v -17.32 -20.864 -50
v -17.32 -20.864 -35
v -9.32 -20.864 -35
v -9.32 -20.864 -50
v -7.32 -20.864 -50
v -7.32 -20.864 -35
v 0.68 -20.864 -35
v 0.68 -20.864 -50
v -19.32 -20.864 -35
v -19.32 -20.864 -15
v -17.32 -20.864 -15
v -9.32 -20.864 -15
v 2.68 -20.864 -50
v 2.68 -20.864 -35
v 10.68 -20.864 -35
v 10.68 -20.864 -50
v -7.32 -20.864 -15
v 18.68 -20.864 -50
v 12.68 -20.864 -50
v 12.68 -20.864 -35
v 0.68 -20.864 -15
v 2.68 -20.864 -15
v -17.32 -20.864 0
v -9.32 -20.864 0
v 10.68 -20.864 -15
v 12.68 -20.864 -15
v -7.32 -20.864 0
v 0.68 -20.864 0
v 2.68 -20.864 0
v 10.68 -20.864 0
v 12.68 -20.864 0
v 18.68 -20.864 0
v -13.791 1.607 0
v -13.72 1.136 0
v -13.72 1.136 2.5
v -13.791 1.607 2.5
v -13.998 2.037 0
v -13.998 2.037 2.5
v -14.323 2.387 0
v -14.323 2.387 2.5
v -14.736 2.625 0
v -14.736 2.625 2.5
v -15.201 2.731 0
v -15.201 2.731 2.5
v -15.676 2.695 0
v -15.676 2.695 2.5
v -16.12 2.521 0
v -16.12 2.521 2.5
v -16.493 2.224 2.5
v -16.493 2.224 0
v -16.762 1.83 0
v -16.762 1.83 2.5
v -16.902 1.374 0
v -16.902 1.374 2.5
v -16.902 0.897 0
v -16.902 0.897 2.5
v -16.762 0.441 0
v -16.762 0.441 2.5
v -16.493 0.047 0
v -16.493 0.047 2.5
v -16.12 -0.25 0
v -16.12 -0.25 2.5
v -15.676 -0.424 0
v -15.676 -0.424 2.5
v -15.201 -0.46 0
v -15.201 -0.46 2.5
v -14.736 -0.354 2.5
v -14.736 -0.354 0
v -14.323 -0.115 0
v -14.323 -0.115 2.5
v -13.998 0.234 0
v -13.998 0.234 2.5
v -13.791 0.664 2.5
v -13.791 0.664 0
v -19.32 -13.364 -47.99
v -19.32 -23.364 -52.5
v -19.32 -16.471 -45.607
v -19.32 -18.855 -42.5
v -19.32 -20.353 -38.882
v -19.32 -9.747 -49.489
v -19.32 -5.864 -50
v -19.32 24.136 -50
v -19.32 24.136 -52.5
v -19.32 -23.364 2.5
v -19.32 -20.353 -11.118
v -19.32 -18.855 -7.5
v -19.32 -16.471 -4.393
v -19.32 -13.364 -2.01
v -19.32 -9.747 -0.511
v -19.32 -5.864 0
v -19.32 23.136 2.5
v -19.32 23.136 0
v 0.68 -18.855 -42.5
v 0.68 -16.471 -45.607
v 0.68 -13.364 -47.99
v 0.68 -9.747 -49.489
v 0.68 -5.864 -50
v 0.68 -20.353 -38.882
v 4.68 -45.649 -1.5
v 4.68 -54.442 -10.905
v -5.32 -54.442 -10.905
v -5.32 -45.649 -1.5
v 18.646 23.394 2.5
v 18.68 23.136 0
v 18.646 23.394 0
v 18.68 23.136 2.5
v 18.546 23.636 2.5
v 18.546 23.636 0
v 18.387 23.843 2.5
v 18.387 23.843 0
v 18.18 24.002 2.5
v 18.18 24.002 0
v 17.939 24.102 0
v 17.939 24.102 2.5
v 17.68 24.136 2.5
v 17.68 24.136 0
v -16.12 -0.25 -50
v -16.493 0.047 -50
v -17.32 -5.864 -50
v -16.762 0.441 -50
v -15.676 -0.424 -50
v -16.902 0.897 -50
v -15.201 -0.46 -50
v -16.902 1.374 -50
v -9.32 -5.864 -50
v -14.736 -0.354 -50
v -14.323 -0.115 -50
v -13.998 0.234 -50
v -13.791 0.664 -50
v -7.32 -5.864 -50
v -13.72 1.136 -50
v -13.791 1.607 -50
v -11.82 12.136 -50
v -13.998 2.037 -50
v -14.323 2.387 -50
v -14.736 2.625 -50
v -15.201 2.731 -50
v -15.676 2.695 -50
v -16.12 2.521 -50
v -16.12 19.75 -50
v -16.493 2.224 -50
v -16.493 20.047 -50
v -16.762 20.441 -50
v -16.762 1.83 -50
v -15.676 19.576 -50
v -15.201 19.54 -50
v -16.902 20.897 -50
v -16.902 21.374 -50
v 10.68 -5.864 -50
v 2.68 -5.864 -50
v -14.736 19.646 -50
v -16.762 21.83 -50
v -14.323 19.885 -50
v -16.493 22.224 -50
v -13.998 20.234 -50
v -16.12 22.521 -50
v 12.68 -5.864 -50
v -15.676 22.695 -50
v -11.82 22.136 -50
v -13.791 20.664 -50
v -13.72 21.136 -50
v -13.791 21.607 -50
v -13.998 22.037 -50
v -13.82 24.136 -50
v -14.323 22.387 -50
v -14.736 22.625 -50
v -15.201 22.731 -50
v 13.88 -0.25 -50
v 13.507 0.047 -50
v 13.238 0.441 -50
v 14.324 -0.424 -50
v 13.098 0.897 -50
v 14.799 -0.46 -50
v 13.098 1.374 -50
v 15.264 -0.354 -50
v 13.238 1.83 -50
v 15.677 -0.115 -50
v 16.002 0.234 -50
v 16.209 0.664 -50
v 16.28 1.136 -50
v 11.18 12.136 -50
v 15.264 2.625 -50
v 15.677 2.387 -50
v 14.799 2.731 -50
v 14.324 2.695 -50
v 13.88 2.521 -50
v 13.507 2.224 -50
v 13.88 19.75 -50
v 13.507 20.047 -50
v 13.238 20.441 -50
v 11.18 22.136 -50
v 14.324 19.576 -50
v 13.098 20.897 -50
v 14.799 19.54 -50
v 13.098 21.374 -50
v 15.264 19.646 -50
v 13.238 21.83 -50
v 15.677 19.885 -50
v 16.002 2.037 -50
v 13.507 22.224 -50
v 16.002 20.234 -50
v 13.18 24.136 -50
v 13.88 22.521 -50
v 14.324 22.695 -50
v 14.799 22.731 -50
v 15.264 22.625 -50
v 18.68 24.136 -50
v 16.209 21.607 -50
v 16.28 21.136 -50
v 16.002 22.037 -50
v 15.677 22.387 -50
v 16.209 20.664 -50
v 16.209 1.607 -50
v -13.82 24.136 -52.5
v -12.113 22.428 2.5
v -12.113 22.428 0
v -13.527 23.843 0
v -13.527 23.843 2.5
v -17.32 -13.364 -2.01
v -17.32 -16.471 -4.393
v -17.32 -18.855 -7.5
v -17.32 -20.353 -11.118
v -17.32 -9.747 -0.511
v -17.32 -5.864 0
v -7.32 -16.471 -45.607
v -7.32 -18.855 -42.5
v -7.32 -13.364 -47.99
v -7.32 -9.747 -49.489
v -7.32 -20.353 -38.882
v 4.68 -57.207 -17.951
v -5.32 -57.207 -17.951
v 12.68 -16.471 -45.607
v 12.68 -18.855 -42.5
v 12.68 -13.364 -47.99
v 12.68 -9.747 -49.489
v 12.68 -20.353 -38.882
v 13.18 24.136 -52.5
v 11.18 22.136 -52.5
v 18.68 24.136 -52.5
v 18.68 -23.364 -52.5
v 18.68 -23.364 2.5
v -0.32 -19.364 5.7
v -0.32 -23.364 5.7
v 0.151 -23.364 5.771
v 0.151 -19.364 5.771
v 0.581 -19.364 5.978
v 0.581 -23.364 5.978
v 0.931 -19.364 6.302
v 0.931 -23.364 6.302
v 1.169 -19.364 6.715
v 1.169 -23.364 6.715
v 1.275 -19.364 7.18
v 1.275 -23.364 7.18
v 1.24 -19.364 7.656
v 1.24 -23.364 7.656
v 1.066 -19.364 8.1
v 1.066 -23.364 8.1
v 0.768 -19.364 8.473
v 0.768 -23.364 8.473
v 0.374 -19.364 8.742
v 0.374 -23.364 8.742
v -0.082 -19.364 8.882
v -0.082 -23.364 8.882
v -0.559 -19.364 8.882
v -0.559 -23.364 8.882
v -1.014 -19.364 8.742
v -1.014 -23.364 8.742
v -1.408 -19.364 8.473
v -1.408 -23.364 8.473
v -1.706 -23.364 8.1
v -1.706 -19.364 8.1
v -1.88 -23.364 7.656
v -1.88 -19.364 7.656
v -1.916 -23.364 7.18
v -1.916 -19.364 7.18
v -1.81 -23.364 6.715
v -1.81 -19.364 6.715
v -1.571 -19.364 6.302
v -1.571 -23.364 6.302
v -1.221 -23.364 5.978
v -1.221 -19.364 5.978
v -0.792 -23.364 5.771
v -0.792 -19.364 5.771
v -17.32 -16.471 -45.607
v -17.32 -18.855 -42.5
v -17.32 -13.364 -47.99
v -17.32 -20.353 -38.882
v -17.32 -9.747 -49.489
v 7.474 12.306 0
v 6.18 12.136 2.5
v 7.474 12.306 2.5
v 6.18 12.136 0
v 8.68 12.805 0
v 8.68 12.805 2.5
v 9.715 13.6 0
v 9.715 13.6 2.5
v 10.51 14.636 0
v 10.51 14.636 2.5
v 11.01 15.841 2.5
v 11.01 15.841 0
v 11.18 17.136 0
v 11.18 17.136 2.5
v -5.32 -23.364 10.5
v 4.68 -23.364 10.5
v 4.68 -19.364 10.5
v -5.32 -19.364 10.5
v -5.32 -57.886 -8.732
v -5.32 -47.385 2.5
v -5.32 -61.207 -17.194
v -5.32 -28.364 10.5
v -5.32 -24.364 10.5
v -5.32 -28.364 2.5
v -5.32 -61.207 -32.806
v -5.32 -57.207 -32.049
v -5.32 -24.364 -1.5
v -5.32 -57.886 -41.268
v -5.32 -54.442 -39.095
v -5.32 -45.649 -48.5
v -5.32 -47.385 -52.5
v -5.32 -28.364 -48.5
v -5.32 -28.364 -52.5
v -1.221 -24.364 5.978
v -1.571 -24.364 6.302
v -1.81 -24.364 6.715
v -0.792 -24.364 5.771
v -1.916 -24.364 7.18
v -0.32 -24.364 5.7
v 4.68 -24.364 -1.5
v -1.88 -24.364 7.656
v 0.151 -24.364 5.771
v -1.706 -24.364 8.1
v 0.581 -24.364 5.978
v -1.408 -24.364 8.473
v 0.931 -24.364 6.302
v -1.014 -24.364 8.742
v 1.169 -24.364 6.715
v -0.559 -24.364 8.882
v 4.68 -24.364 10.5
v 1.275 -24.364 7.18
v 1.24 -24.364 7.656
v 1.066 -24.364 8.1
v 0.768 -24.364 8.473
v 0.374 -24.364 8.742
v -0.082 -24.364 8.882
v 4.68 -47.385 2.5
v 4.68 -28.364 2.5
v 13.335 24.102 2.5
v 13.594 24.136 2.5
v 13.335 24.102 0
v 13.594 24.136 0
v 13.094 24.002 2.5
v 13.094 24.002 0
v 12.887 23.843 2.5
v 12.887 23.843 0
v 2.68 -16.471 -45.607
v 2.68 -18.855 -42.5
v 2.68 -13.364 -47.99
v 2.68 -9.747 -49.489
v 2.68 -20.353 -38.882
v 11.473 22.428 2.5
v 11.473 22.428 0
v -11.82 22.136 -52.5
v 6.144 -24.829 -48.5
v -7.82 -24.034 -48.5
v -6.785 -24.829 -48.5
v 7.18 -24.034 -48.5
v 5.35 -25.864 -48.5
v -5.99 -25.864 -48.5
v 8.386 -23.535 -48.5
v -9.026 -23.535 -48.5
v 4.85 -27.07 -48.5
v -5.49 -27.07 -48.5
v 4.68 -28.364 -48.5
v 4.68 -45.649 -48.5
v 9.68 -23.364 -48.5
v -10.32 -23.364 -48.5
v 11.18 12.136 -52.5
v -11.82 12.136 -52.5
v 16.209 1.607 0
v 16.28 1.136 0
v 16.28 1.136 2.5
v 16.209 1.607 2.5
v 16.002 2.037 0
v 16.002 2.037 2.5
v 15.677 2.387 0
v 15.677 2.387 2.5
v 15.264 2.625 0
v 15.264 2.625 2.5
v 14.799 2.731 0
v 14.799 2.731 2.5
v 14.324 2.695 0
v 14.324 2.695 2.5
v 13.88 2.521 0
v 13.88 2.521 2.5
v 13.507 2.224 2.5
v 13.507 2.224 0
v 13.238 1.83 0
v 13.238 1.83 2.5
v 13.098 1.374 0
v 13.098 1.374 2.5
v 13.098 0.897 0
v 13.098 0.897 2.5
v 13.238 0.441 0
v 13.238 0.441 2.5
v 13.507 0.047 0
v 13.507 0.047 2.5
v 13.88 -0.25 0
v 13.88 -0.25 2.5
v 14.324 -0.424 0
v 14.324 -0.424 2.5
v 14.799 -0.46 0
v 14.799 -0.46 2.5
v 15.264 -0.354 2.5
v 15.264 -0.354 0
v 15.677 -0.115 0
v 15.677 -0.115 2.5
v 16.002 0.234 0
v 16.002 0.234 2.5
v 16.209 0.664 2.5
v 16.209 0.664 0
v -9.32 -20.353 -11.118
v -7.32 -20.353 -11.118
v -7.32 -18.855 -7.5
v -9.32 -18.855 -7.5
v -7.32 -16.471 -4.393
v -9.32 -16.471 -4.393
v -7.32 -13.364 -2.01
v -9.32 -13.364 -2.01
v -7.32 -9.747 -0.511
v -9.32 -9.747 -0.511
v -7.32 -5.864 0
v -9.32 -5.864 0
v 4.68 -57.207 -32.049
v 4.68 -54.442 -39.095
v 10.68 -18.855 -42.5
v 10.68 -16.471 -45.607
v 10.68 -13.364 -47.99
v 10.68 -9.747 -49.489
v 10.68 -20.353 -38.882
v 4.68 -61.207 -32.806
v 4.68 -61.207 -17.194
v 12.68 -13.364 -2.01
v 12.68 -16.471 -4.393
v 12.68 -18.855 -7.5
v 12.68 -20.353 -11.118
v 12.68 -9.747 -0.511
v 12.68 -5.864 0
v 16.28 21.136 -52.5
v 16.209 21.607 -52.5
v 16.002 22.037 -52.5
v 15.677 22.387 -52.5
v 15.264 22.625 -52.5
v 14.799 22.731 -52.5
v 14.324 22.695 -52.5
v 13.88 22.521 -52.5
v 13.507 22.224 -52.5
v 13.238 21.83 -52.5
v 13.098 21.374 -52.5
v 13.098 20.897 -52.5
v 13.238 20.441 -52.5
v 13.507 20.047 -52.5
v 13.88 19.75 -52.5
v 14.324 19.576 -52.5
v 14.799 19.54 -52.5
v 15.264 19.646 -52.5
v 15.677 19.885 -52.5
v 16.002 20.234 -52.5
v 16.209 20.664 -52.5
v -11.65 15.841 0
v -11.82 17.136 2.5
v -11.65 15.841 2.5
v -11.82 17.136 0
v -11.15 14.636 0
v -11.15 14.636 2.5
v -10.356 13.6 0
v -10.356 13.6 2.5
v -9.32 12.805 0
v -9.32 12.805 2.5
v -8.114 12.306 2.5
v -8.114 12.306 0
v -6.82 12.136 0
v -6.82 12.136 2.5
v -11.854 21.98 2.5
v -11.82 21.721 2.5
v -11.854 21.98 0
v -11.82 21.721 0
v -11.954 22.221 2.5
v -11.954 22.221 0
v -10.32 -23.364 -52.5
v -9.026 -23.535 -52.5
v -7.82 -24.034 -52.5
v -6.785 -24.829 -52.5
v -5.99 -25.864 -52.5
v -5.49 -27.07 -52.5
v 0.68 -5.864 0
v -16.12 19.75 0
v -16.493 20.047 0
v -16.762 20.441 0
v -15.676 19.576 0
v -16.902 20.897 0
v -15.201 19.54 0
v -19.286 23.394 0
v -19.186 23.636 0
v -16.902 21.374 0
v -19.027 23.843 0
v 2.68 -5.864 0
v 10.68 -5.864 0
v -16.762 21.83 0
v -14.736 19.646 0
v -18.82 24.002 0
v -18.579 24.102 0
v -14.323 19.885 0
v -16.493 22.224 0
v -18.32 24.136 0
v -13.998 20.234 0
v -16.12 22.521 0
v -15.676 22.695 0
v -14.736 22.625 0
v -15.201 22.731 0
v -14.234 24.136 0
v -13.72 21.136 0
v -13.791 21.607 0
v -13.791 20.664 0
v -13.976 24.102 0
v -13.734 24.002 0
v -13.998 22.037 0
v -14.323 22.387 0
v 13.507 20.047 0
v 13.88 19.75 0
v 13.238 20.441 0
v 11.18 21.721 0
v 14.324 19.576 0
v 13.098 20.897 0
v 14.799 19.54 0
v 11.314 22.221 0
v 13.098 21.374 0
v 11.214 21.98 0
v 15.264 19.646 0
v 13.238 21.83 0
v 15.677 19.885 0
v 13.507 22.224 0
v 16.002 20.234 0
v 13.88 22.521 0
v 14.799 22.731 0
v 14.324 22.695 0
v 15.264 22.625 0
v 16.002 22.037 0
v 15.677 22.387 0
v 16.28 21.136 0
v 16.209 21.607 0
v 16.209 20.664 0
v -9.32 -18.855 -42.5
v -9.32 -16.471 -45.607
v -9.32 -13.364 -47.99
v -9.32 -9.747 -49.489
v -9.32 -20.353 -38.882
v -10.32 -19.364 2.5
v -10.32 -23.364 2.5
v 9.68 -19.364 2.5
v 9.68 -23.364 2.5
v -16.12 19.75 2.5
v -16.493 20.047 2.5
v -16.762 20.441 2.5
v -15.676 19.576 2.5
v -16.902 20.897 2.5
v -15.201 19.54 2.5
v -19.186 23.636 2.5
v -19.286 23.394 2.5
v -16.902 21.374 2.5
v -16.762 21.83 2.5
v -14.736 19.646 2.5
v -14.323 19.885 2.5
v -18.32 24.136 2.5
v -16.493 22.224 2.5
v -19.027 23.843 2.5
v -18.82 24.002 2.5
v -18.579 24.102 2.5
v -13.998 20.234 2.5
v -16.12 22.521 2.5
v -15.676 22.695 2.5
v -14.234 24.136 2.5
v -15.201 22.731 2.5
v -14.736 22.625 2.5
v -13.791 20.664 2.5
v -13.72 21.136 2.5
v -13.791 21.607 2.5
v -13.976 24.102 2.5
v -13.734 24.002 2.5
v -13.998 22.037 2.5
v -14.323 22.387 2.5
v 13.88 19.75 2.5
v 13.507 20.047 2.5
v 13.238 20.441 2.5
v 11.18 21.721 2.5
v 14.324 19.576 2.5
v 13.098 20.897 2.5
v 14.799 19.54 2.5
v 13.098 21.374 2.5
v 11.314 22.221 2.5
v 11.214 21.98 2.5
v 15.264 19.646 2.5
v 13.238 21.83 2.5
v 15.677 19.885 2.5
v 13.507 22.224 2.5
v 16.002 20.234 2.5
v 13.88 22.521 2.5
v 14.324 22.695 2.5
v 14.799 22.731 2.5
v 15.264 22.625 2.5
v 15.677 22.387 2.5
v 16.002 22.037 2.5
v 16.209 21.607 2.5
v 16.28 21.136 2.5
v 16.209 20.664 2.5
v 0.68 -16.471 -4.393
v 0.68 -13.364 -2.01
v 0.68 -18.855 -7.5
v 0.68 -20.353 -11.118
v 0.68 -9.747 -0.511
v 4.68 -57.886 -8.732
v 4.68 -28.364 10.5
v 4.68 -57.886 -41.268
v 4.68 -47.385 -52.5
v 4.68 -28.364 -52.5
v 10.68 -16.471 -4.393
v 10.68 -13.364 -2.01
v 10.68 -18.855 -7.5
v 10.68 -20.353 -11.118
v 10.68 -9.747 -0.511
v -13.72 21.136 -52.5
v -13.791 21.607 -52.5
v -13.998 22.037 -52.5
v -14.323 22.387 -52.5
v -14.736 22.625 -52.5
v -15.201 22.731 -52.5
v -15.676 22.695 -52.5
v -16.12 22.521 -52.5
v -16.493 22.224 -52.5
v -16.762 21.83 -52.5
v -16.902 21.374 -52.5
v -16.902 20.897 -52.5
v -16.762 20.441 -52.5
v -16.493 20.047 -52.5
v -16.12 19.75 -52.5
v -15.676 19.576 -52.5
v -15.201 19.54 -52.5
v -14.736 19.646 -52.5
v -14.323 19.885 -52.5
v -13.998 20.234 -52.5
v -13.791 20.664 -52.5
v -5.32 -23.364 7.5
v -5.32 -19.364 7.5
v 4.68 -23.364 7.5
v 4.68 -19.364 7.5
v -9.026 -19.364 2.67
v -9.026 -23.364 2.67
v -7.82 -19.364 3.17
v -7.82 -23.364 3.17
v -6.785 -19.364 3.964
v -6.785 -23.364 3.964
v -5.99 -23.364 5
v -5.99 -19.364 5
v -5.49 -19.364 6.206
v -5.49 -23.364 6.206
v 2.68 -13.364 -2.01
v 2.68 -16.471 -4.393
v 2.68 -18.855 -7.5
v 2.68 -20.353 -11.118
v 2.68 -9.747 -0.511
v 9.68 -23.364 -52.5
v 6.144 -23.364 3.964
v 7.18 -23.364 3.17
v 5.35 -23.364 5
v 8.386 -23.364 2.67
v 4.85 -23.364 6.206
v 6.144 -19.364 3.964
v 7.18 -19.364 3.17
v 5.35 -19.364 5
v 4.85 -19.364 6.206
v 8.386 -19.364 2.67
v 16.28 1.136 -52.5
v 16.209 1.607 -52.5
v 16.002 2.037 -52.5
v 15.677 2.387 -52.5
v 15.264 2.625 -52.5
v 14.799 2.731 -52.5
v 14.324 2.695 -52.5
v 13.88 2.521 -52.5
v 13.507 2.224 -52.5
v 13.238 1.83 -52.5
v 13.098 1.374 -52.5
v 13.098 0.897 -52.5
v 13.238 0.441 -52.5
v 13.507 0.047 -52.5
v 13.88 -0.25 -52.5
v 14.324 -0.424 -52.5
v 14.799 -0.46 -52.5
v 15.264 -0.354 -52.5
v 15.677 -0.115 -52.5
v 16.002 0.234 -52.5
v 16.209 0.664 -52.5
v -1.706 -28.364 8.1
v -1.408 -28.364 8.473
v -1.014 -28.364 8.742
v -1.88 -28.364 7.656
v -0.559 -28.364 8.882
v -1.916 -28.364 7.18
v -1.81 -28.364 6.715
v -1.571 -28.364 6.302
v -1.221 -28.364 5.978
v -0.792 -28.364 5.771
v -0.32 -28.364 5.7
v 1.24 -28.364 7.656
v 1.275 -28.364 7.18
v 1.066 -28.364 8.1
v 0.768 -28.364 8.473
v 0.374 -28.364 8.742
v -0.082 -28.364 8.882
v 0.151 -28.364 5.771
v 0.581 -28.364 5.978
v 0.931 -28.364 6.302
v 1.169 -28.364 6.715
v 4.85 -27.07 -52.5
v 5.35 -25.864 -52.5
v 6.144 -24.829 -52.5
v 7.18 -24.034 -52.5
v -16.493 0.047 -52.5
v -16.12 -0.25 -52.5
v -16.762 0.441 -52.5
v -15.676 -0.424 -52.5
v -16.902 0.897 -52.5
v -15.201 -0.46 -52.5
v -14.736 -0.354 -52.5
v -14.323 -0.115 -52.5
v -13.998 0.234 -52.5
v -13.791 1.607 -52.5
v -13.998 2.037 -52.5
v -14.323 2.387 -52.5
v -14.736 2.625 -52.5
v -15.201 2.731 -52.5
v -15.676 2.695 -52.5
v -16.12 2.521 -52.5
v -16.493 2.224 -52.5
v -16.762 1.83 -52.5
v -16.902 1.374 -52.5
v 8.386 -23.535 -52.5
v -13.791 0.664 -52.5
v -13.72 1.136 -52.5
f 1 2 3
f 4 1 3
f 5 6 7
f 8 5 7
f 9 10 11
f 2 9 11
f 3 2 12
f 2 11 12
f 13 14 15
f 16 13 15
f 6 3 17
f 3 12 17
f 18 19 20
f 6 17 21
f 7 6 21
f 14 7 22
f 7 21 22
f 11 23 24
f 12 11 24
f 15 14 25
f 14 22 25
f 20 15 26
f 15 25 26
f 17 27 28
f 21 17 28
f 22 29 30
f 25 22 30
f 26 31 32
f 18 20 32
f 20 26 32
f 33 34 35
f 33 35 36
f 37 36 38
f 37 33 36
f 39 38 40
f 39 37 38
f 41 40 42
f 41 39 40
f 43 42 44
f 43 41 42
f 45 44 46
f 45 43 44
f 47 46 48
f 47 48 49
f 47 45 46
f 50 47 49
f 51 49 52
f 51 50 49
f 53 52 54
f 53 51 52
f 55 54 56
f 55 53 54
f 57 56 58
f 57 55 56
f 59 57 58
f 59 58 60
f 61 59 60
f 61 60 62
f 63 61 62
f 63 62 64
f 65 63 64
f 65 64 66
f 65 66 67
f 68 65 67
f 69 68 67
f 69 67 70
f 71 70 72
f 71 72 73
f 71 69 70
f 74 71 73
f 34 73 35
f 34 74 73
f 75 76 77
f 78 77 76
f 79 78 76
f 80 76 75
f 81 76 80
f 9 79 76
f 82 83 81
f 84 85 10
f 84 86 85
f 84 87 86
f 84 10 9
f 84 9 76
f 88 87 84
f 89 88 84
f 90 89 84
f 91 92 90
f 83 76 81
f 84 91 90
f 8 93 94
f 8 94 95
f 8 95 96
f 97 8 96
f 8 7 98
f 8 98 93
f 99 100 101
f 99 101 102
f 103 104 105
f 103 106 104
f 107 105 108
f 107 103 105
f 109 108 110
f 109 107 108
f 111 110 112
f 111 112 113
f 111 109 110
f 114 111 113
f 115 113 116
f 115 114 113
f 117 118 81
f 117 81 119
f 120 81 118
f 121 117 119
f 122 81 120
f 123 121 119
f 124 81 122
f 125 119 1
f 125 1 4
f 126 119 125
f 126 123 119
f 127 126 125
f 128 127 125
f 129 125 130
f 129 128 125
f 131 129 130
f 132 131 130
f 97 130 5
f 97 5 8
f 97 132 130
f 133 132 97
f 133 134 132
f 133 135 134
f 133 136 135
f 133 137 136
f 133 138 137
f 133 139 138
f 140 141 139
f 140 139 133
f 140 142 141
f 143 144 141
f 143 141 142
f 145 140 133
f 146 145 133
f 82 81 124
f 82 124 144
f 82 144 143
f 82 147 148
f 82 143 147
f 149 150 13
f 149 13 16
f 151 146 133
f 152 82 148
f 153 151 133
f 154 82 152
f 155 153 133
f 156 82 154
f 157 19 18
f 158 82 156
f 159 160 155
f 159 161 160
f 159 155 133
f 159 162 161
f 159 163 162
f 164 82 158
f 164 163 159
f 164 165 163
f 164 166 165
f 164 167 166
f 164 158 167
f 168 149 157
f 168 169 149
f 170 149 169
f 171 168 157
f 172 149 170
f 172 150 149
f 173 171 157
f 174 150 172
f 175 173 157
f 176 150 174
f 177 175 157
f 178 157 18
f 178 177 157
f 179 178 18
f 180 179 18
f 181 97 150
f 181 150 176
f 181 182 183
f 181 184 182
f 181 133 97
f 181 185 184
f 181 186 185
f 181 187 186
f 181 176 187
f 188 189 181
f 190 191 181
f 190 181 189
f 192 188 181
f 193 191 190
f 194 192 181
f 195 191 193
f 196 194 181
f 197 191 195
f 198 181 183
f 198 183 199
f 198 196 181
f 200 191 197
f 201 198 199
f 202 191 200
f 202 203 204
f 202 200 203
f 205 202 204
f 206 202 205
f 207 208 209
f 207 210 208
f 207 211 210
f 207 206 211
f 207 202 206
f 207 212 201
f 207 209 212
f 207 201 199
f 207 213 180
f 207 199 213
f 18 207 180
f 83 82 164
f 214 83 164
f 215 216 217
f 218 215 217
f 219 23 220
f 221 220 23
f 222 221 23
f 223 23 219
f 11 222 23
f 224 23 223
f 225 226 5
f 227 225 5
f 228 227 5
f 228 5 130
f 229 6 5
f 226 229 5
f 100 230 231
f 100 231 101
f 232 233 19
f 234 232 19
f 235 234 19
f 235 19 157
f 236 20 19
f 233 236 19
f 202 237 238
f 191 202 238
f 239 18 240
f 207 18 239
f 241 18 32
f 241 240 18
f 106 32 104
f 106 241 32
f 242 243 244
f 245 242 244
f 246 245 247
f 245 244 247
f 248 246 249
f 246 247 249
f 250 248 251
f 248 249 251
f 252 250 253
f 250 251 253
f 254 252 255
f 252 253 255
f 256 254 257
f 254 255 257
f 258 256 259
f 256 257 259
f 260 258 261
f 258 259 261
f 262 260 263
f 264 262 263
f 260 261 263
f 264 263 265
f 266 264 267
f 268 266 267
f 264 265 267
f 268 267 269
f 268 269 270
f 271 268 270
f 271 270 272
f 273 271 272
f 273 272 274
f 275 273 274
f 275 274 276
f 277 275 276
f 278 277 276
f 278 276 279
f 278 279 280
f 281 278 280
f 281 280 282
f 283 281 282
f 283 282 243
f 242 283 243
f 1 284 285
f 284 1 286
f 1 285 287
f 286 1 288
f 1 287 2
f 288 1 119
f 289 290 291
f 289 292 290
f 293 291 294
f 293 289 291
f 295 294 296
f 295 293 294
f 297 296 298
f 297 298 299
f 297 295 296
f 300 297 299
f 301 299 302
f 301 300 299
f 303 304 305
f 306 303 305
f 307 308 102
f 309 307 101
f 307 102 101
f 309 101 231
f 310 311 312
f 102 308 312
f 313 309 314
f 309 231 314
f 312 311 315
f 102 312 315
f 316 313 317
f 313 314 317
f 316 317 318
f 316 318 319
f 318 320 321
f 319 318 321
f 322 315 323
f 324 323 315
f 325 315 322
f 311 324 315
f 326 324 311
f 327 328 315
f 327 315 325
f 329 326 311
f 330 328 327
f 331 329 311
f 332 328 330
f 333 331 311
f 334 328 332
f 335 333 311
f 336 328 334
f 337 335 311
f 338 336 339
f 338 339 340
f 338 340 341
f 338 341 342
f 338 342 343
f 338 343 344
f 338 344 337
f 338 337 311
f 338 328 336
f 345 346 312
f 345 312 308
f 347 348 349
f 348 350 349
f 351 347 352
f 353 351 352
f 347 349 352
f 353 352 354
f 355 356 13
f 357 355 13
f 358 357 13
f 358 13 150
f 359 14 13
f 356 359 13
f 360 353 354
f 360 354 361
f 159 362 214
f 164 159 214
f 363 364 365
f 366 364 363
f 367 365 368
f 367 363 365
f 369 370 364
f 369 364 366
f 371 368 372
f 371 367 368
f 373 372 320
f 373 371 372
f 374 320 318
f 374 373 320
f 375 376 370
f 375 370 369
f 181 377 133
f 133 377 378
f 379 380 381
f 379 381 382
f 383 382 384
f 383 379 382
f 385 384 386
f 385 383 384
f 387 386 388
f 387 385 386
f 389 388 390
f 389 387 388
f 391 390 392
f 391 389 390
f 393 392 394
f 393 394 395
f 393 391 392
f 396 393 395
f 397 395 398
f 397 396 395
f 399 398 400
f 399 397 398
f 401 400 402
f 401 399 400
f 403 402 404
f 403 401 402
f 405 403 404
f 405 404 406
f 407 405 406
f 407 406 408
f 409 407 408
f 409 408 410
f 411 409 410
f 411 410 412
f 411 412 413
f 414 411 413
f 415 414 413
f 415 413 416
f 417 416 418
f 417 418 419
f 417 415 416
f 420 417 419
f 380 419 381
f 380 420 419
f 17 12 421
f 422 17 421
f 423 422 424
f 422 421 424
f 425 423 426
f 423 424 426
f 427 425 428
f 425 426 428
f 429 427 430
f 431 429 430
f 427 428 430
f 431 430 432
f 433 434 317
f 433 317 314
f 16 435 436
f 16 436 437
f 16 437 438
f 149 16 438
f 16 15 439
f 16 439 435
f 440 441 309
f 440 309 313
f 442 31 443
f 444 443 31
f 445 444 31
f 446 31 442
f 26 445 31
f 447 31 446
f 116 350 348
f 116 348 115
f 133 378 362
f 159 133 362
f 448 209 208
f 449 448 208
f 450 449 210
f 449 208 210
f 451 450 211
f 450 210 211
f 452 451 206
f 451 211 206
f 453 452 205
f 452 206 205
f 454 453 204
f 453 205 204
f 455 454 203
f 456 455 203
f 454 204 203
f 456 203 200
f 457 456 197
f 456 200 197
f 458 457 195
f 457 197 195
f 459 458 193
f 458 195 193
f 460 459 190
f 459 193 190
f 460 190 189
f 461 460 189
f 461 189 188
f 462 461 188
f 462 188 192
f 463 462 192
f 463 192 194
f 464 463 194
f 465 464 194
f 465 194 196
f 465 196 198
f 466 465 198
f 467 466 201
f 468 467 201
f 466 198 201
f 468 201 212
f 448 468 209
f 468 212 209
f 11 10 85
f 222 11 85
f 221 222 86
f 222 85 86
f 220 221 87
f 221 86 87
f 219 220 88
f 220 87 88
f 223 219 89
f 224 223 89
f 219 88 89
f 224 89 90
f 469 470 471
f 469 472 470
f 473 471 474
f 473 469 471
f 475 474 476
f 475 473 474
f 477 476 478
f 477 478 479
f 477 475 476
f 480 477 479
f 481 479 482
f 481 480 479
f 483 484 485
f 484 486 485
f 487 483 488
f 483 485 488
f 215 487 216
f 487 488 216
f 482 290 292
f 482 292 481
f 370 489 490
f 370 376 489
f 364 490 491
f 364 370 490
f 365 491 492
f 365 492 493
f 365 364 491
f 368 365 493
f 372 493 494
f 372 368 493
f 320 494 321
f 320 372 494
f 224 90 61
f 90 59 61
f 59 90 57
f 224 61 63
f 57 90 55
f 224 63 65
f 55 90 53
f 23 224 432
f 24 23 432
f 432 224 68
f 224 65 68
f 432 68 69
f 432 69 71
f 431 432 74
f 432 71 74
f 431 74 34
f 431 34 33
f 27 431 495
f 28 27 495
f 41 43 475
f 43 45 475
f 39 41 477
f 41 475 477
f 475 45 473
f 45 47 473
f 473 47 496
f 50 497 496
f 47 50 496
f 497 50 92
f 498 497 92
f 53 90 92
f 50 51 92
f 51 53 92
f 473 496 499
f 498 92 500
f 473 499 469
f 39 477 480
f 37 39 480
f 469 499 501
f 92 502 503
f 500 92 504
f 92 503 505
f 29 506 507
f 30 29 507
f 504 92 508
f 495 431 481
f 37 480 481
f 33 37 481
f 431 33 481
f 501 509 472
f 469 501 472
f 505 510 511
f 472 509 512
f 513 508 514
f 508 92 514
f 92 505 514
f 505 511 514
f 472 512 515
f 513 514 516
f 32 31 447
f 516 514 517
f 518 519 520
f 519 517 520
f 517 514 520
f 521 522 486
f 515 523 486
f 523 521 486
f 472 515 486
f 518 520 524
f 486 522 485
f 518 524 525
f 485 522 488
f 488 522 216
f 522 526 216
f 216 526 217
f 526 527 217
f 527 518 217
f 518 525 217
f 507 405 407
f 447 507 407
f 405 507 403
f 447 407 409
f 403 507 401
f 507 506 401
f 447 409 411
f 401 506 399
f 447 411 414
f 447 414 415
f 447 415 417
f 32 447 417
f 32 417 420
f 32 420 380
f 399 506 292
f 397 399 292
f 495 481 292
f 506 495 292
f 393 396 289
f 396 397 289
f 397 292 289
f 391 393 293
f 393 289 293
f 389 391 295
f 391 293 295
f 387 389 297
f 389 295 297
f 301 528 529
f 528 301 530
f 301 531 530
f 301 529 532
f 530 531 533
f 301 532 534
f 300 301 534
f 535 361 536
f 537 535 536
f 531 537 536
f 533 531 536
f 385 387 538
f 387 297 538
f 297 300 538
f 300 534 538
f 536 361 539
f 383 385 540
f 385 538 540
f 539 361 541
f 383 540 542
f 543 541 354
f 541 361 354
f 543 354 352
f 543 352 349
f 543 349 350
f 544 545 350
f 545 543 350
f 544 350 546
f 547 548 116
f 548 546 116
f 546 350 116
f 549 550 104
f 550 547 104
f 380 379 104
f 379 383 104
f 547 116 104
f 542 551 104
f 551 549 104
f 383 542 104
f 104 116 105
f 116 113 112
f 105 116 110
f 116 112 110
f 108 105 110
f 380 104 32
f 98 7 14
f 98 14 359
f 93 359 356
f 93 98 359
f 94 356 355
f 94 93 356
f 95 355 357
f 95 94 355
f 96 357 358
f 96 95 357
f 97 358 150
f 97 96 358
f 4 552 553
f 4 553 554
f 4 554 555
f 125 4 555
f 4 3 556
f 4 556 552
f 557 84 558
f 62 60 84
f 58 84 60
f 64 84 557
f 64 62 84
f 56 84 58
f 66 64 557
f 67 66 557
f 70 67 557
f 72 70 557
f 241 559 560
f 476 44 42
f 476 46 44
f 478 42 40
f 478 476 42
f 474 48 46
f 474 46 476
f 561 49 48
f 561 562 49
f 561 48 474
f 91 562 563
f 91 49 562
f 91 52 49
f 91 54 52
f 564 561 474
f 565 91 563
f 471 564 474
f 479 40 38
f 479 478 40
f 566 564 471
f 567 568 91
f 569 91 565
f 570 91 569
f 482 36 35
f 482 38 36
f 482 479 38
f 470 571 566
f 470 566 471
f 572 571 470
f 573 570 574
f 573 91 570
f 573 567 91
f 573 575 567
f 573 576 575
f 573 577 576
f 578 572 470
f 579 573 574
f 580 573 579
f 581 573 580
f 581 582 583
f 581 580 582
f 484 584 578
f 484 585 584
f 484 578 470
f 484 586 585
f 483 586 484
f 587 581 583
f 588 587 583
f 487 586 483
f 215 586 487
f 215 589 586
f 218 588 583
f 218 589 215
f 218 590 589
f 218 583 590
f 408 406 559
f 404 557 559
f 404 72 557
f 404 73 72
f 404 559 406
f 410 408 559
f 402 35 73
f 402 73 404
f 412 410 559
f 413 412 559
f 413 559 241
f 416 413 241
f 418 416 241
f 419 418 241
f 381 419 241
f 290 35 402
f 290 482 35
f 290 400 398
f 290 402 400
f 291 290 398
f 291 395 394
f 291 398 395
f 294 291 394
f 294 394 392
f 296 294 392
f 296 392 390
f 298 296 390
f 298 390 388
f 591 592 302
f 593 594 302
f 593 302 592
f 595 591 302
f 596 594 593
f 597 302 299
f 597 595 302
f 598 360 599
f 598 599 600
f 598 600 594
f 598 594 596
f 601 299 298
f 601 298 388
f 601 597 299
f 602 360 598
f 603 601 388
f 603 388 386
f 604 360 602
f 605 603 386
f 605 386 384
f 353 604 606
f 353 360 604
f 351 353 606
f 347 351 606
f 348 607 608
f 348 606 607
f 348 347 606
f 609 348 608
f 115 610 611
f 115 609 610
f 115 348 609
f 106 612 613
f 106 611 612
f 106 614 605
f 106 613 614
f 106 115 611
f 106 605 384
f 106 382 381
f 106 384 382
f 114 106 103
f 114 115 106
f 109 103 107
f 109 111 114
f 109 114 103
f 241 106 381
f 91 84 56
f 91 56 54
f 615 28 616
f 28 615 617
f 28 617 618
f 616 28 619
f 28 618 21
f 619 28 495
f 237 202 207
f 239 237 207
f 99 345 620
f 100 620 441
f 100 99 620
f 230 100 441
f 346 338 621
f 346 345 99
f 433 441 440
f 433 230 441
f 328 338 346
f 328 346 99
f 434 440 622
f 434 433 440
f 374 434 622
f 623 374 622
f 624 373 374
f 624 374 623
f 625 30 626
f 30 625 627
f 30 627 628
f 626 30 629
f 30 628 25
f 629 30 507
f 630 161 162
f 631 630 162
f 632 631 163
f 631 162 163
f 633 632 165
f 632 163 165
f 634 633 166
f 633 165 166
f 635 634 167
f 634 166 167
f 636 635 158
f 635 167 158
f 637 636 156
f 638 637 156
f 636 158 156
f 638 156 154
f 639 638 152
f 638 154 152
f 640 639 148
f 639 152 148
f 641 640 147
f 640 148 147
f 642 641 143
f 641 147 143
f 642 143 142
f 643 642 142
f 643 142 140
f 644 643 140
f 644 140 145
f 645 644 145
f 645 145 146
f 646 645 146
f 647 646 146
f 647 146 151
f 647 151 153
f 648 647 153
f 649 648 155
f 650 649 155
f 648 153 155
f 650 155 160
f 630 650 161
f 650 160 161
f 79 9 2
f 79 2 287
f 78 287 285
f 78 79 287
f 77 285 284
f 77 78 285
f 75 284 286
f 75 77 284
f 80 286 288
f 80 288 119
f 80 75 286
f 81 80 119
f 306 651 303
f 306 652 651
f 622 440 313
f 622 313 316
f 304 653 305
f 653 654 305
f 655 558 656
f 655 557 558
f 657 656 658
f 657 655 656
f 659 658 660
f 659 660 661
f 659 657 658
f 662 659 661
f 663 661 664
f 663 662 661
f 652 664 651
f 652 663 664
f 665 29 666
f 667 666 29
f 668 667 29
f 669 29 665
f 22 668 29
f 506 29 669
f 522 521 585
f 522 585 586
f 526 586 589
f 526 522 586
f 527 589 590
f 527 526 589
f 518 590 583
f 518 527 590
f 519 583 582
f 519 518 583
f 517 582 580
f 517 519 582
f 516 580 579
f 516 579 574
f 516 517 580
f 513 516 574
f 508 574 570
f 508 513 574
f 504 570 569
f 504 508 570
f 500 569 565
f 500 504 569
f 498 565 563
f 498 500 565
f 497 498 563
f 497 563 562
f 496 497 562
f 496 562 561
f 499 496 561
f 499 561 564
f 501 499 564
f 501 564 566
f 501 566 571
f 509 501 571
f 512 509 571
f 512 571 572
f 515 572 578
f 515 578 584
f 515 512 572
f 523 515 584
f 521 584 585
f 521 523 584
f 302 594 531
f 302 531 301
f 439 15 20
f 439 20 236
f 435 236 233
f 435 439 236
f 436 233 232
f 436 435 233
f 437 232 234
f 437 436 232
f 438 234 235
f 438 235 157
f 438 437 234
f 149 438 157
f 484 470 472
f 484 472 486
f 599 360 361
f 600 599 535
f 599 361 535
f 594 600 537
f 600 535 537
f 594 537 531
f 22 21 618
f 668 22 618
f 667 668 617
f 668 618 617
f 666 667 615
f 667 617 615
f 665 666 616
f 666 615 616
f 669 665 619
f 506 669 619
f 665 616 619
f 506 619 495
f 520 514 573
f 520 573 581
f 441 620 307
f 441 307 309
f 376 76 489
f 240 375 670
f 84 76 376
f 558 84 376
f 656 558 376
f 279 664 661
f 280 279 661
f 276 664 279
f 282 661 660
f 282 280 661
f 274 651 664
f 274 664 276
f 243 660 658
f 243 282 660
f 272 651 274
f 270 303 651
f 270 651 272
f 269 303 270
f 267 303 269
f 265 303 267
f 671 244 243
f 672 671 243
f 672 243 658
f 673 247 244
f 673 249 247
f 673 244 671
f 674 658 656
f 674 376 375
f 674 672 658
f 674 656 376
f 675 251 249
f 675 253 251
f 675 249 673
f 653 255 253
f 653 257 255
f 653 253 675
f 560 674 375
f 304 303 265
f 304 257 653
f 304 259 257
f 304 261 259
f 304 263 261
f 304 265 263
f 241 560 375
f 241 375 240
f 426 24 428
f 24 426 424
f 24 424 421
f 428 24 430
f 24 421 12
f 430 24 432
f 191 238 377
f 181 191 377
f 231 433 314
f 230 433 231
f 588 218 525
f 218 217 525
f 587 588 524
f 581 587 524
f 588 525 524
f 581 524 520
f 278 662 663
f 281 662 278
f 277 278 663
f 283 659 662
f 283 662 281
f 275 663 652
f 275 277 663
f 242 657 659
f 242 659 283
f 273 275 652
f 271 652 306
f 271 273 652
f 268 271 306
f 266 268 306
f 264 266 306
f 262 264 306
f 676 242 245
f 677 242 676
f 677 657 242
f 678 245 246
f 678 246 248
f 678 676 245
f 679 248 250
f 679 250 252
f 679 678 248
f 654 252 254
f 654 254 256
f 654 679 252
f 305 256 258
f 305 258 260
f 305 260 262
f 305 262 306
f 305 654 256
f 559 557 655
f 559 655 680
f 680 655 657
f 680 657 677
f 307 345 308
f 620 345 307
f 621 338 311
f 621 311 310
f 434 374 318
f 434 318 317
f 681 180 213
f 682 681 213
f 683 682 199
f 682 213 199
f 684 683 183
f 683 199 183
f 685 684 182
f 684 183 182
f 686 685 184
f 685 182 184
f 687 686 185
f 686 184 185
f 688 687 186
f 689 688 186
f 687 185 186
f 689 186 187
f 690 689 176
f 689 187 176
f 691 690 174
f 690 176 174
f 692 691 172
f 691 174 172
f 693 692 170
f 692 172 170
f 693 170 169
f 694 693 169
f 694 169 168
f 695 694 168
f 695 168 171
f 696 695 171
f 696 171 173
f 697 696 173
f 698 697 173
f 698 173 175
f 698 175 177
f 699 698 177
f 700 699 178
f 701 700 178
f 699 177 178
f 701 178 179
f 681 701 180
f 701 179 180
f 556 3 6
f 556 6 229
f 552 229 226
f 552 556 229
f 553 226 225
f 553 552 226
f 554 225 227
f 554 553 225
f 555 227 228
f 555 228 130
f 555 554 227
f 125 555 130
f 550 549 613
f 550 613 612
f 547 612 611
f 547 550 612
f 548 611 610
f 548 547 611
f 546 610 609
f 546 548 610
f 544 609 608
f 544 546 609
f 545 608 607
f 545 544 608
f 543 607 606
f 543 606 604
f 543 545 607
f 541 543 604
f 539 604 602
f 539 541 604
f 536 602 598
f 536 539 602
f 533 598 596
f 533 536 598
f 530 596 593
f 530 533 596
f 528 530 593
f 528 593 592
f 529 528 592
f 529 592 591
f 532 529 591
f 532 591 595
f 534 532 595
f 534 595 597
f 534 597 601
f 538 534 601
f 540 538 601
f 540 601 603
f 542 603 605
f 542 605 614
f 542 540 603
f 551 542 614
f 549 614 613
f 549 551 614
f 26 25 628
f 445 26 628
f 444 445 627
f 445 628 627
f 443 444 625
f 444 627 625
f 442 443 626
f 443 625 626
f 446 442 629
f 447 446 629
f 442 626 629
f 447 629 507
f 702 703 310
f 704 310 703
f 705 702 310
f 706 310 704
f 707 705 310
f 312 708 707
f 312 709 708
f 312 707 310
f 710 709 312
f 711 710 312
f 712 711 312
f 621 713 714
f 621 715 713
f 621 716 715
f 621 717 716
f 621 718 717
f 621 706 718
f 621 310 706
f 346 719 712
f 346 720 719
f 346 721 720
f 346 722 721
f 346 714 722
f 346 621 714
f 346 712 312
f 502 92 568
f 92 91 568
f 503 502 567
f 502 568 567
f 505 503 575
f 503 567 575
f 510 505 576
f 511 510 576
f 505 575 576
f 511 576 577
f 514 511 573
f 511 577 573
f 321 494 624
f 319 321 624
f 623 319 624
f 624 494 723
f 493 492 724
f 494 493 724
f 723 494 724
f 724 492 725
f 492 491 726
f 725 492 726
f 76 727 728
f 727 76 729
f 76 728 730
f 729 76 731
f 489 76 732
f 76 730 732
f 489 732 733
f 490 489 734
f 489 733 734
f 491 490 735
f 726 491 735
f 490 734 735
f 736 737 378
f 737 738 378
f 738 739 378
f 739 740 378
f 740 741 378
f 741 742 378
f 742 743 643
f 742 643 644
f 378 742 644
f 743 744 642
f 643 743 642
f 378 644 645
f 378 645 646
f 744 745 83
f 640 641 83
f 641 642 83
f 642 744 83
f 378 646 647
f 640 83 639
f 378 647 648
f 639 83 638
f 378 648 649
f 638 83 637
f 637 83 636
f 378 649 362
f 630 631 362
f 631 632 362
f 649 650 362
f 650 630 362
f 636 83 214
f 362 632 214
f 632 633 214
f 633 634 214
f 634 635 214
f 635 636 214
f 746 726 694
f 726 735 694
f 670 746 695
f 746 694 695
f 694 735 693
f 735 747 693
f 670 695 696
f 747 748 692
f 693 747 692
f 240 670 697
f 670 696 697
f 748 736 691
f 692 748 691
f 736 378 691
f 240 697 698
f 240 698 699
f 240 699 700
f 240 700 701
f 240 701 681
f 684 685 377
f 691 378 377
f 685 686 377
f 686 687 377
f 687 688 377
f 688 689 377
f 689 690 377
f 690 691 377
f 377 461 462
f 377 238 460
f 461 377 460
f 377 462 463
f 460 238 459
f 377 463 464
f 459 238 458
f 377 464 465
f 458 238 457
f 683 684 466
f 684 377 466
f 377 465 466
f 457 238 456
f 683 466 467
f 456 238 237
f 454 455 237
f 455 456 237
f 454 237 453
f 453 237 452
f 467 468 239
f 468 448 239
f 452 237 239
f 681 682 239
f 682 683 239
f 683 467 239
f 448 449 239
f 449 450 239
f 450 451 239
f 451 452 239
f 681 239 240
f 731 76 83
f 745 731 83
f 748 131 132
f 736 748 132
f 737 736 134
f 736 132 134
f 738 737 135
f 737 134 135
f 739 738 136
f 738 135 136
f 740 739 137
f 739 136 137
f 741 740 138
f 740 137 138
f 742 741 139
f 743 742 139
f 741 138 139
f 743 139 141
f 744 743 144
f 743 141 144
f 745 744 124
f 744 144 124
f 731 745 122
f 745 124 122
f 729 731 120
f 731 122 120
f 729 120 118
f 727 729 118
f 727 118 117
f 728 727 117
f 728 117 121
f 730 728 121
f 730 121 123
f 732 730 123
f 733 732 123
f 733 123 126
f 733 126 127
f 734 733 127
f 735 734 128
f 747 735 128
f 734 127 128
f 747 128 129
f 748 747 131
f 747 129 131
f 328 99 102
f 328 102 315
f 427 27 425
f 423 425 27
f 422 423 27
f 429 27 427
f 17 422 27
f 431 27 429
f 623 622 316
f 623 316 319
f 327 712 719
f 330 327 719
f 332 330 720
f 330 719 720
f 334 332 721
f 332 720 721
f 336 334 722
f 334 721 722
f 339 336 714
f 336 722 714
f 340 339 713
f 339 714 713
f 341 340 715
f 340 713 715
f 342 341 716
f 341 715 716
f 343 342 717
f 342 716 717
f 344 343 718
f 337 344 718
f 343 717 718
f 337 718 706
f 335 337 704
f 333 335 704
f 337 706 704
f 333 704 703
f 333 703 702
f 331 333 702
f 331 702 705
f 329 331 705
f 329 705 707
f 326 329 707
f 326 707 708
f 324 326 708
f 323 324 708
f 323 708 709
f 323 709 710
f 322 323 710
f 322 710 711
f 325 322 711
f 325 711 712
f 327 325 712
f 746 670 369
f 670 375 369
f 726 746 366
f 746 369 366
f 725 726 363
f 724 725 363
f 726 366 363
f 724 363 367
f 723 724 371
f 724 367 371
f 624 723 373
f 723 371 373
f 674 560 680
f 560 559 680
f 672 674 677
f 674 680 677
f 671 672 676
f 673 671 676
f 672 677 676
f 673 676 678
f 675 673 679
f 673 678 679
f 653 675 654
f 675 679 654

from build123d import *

# Parameters (mm, degrees)
SKETCH_1_W           = 38
SKETCH_1_H           = 45
SKETCH_1_R           = 1.6
EXTRUDE_1_DEPTH      = 2.5
CUT_EXTRUDE_1_DEPTH  = 2.5
SKETCH_3_W           = 38
SKETCH_3_H           = 55
EXTRUDE_2_DEPTH      = 2.5
FILLET_3_R           = 1
FILLET1_R            = 5
EXTRUDE3_DEPTH       = 2
LPATTERN1_COUNT      = 4
LPATTERN1_PITCH      = 10
MIRROR3_COPY_1_DEPTH = 2
MIRROR3_COPY_2_DEPTH = 2
MIRROR3_COPY_3_DEPTH = 2
EXTRUDE4_DEPTH       = 5
EXTRUDE4_DEPTH_BACK  = 5
SKETCH5_W            = 8
SKETCH5_H            = 4
SKETCH6_R            = 1.6
CUT_EXTRUDE1_DEPTH   = 20
FILLET2_R            = 5
FILLET3_R            = 5


with BuildPart() as part:
    # 草图1 → 凸台-拉伸1 (new body)
    with BuildSketch(Plane.XY):
        with Locations((-0.320113314, 1.635589826)):
            Rectangle(SKETCH_1_W, SKETCH_1_H)
        with Locations((-15.320113314, 21.135589826)):
            Circle(SKETCH_1_R, mode=Mode.SUBTRACT)
        with Locations((14.679886686, 21.135589826)):
            Circle(SKETCH_1_R, mode=Mode.SUBTRACT)
        with Locations((-15.320113314, 1.135589826)):
            Circle(SKETCH_1_R, mode=Mode.SUBTRACT)
        with Locations((14.679886686, 1.135589826)):
            Circle(SKETCH_1_R, mode=Mode.SUBTRACT)
    extrude_1 = extrude(amount=EXTRUDE_1_DEPTH)

    # 草图2 → 切除-拉伸1 (cut)
    with BuildSketch(Plane.XY.offset(2.5)):
        Polygon((-11.820113314, 24.135589826), (11.179886686, 24.135589826), (13.179886686, 24.135589826), (11.179886686, 22.135589826), (11.179886686, 12.135589826), (-11.820113314, 12.135589826), (-11.820113314, 22.135589826), (-13.820113314, 24.135589826), align=None)
    cut_extrude_1 = extrude(amount=-CUT_EXTRUDE_1_DEPTH, mode=Mode.SUBTRACT)

    # 草图3 → 凸台-拉伸2 (add)
    with BuildSketch(Plane.XZ.offset(20.864410174)):
        with Locations((-0.320113314, -25)):
            Rectangle(SKETCH_3_W, SKETCH_3_H)
    extrude(amount=EXTRUDE_2_DEPTH)

    # 圆角3
    fillet_3_edges = [part.edges().sort_by_distance(p)[0] for p in [
        (-13.820113314, 24.135589826, 1.25),
        (13.179886686, 24.135589826, 1.25),
        (11.179886686, 22.135589826, 1.25),
        (-11.820113314, 22.135589826, 1.25),
        (-19.320113314, 24.135589826, 1.25),
        (18.679886686, 24.135589826, 1.25),
    ]]
    fillet(fillet_3_edges, radius=FILLET_3_R)

    # Fillet1
    fillet1_edges = [part.edges().sort_by_distance(p)[0] for p in [
        (11.179886686, 12.135589826, 1.25),
        (-11.820113314, 12.135589826, 1.25),
    ]]
    fillet(fillet1_edges, radius=FILLET1_R)

    # Sketch4 → Extrude3 (add)
    with BuildSketch(Plane.ZY.offset(19.320113314)):
        with BuildLine():
            Line((0, -5.864410174), (0, -20.864410174))
            Line((0, -20.864410174), (-15, -20.864410174))
            ThreePointArc((-15, -20.864410174), (-4.393398282, -16.471011892), (0, -5.864410174))
        make_face()
    extrude3 = extrude(amount=-EXTRUDE3_DEPTH)

    # Mirror1: 凸台-拉伸1 across plane
    add(extrude_1.mirror(Plane(origin=(0, 0, -25), x_dir=(1, 0, 0), z_dir=(0, 0, -1))))

    # Mirror2: 切除-拉伸1 across plane
    add(cut_extrude_1.mirror(Plane(origin=(0, 0, -25), x_dir=(1, 0, 0), z_dir=(0, 0, -1))), mode=Mode.SUBTRACT)

    # LPattern1: Extrude3 ×4
    with Locations(*[(i * LPATTERN1_PITCH, 0, 0) for i in range(1, LPATTERN1_COUNT)]):
        add(extrude3)

    # Mirror3: Extrude3 across plane
    add(extrude3.mirror(Plane(origin=(0, 0, -25), x_dir=(1, 0, 0), z_dir=(0, 0, -1))))

    # Mirror3 copy 1 sketch → Mirror3 copy 1 (add)
    with BuildSketch(Plane(origin=(-9.320113314, 0, -50), x_dir=(0, 0, -1), z_dir=(-1, 0, 0))):
        with BuildLine():
            Line((0, 5.864410174), (0, 20.864410174))
            Line((0, 20.864410174), (-15, 20.864410174))
            ThreePointArc((-15, 20.864410174), (-4.393398282, 16.471011892), (0, 5.864410174))
        make_face()
    extrude(amount=-MIRROR3_COPY_1_DEPTH)

    # Mirror3 copy 2 sketch → Mirror3 copy 2 (add)
    with BuildSketch(Plane(origin=(0.679886686, 0, -50), x_dir=(0, 0, -1), z_dir=(-1, 0, 0))):
        with BuildLine():
            Line((0, 5.864410174), (0, 20.864410174))
            Line((0, 20.864410174), (-15, 20.864410174))
            ThreePointArc((-15, 20.864410174), (-4.393398282, 16.471011892), (0, 5.864410174))
        make_face()
    extrude(amount=-MIRROR3_COPY_2_DEPTH)

    # Mirror3 copy 3 sketch → Mirror3 copy 3 (add)
    with BuildSketch(Plane(origin=(10.679886686, 0, -50), x_dir=(0, 0, -1), z_dir=(-1, 0, 0))):
        with BuildLine():
            Line((0, 5.864410174), (0, 20.864410174))
            Line((0, 20.864410174), (-15, 20.864410174))
            ThreePointArc((-15, 20.864410174), (-4.393398282, 16.471011892), (0, 5.864410174))
        make_face()
    extrude(amount=-MIRROR3_COPY_3_DEPTH)

    # Sketch5 → Extrude4 (add, two sides: drawn at the far end of the back side and taken through both)
    with BuildSketch(Plane.ZY.offset(0.320113314).offset(-EXTRUDE4_DEPTH_BACK)):
        Polygon((-48.5, -23.364410174), (-48.5, -45.648790241), (-39.095261683, -54.441591814), (-32.049269501, -57.2068117), (-17.950730499, -57.2068117), (-10.904738317, -54.441591814), (-1.5, -45.648790241), (-1.5, -24.364410174), (10.5, -24.364410174), (10.5, -28.364410174), (2.5, -28.364410174), (2.5, -47.384968523), (-8.731572968, -57.885738362), (-17.193922344, -61.2068117), (-32.806077656, -61.2068117), (-41.268427032, -57.885738362), (-52.5, -47.384968523), (-52.5, -23.364410174), align=None)
        with Locations((6.5, -21.364410174)):
            Rectangle(SKETCH5_W, SKETCH5_H)
    extrude(amount=EXTRUDE4_DEPTH + EXTRUDE4_DEPTH_BACK)

    # Sketch6 → Cut-Extrude1 (cut)
    with BuildSketch(Plane.XZ.offset(28.364410174)):
        with Locations(Location((-0.320113314, 7.3, 0), (0, 0, 270))):
            Circle(SKETCH6_R)
    extrude(amount=-CUT_EXTRUDE1_DEPTH, mode=Mode.SUBTRACT)

    # Fillet2
    fillet2_edges = [part.edges().sort_by_distance(p)[0] for p in [
        (4.679886686, -23.364410174, -50.5),
        (-5.320113314, -23.364410174, -50.5),
    ]]
    fillet(fillet2_edges, radius=FILLET2_R)

    # Fillet3
    fillet3_edges = [part.edges().sort_by_distance(p)[0] for p in [
        (4.679886686, -21.364410174, 2.5),
        (-5.320113314, -21.364410174, 2.5),
    ]]
    fillet(fillet3_edges, radius=FILLET3_R)


solid = part.part
